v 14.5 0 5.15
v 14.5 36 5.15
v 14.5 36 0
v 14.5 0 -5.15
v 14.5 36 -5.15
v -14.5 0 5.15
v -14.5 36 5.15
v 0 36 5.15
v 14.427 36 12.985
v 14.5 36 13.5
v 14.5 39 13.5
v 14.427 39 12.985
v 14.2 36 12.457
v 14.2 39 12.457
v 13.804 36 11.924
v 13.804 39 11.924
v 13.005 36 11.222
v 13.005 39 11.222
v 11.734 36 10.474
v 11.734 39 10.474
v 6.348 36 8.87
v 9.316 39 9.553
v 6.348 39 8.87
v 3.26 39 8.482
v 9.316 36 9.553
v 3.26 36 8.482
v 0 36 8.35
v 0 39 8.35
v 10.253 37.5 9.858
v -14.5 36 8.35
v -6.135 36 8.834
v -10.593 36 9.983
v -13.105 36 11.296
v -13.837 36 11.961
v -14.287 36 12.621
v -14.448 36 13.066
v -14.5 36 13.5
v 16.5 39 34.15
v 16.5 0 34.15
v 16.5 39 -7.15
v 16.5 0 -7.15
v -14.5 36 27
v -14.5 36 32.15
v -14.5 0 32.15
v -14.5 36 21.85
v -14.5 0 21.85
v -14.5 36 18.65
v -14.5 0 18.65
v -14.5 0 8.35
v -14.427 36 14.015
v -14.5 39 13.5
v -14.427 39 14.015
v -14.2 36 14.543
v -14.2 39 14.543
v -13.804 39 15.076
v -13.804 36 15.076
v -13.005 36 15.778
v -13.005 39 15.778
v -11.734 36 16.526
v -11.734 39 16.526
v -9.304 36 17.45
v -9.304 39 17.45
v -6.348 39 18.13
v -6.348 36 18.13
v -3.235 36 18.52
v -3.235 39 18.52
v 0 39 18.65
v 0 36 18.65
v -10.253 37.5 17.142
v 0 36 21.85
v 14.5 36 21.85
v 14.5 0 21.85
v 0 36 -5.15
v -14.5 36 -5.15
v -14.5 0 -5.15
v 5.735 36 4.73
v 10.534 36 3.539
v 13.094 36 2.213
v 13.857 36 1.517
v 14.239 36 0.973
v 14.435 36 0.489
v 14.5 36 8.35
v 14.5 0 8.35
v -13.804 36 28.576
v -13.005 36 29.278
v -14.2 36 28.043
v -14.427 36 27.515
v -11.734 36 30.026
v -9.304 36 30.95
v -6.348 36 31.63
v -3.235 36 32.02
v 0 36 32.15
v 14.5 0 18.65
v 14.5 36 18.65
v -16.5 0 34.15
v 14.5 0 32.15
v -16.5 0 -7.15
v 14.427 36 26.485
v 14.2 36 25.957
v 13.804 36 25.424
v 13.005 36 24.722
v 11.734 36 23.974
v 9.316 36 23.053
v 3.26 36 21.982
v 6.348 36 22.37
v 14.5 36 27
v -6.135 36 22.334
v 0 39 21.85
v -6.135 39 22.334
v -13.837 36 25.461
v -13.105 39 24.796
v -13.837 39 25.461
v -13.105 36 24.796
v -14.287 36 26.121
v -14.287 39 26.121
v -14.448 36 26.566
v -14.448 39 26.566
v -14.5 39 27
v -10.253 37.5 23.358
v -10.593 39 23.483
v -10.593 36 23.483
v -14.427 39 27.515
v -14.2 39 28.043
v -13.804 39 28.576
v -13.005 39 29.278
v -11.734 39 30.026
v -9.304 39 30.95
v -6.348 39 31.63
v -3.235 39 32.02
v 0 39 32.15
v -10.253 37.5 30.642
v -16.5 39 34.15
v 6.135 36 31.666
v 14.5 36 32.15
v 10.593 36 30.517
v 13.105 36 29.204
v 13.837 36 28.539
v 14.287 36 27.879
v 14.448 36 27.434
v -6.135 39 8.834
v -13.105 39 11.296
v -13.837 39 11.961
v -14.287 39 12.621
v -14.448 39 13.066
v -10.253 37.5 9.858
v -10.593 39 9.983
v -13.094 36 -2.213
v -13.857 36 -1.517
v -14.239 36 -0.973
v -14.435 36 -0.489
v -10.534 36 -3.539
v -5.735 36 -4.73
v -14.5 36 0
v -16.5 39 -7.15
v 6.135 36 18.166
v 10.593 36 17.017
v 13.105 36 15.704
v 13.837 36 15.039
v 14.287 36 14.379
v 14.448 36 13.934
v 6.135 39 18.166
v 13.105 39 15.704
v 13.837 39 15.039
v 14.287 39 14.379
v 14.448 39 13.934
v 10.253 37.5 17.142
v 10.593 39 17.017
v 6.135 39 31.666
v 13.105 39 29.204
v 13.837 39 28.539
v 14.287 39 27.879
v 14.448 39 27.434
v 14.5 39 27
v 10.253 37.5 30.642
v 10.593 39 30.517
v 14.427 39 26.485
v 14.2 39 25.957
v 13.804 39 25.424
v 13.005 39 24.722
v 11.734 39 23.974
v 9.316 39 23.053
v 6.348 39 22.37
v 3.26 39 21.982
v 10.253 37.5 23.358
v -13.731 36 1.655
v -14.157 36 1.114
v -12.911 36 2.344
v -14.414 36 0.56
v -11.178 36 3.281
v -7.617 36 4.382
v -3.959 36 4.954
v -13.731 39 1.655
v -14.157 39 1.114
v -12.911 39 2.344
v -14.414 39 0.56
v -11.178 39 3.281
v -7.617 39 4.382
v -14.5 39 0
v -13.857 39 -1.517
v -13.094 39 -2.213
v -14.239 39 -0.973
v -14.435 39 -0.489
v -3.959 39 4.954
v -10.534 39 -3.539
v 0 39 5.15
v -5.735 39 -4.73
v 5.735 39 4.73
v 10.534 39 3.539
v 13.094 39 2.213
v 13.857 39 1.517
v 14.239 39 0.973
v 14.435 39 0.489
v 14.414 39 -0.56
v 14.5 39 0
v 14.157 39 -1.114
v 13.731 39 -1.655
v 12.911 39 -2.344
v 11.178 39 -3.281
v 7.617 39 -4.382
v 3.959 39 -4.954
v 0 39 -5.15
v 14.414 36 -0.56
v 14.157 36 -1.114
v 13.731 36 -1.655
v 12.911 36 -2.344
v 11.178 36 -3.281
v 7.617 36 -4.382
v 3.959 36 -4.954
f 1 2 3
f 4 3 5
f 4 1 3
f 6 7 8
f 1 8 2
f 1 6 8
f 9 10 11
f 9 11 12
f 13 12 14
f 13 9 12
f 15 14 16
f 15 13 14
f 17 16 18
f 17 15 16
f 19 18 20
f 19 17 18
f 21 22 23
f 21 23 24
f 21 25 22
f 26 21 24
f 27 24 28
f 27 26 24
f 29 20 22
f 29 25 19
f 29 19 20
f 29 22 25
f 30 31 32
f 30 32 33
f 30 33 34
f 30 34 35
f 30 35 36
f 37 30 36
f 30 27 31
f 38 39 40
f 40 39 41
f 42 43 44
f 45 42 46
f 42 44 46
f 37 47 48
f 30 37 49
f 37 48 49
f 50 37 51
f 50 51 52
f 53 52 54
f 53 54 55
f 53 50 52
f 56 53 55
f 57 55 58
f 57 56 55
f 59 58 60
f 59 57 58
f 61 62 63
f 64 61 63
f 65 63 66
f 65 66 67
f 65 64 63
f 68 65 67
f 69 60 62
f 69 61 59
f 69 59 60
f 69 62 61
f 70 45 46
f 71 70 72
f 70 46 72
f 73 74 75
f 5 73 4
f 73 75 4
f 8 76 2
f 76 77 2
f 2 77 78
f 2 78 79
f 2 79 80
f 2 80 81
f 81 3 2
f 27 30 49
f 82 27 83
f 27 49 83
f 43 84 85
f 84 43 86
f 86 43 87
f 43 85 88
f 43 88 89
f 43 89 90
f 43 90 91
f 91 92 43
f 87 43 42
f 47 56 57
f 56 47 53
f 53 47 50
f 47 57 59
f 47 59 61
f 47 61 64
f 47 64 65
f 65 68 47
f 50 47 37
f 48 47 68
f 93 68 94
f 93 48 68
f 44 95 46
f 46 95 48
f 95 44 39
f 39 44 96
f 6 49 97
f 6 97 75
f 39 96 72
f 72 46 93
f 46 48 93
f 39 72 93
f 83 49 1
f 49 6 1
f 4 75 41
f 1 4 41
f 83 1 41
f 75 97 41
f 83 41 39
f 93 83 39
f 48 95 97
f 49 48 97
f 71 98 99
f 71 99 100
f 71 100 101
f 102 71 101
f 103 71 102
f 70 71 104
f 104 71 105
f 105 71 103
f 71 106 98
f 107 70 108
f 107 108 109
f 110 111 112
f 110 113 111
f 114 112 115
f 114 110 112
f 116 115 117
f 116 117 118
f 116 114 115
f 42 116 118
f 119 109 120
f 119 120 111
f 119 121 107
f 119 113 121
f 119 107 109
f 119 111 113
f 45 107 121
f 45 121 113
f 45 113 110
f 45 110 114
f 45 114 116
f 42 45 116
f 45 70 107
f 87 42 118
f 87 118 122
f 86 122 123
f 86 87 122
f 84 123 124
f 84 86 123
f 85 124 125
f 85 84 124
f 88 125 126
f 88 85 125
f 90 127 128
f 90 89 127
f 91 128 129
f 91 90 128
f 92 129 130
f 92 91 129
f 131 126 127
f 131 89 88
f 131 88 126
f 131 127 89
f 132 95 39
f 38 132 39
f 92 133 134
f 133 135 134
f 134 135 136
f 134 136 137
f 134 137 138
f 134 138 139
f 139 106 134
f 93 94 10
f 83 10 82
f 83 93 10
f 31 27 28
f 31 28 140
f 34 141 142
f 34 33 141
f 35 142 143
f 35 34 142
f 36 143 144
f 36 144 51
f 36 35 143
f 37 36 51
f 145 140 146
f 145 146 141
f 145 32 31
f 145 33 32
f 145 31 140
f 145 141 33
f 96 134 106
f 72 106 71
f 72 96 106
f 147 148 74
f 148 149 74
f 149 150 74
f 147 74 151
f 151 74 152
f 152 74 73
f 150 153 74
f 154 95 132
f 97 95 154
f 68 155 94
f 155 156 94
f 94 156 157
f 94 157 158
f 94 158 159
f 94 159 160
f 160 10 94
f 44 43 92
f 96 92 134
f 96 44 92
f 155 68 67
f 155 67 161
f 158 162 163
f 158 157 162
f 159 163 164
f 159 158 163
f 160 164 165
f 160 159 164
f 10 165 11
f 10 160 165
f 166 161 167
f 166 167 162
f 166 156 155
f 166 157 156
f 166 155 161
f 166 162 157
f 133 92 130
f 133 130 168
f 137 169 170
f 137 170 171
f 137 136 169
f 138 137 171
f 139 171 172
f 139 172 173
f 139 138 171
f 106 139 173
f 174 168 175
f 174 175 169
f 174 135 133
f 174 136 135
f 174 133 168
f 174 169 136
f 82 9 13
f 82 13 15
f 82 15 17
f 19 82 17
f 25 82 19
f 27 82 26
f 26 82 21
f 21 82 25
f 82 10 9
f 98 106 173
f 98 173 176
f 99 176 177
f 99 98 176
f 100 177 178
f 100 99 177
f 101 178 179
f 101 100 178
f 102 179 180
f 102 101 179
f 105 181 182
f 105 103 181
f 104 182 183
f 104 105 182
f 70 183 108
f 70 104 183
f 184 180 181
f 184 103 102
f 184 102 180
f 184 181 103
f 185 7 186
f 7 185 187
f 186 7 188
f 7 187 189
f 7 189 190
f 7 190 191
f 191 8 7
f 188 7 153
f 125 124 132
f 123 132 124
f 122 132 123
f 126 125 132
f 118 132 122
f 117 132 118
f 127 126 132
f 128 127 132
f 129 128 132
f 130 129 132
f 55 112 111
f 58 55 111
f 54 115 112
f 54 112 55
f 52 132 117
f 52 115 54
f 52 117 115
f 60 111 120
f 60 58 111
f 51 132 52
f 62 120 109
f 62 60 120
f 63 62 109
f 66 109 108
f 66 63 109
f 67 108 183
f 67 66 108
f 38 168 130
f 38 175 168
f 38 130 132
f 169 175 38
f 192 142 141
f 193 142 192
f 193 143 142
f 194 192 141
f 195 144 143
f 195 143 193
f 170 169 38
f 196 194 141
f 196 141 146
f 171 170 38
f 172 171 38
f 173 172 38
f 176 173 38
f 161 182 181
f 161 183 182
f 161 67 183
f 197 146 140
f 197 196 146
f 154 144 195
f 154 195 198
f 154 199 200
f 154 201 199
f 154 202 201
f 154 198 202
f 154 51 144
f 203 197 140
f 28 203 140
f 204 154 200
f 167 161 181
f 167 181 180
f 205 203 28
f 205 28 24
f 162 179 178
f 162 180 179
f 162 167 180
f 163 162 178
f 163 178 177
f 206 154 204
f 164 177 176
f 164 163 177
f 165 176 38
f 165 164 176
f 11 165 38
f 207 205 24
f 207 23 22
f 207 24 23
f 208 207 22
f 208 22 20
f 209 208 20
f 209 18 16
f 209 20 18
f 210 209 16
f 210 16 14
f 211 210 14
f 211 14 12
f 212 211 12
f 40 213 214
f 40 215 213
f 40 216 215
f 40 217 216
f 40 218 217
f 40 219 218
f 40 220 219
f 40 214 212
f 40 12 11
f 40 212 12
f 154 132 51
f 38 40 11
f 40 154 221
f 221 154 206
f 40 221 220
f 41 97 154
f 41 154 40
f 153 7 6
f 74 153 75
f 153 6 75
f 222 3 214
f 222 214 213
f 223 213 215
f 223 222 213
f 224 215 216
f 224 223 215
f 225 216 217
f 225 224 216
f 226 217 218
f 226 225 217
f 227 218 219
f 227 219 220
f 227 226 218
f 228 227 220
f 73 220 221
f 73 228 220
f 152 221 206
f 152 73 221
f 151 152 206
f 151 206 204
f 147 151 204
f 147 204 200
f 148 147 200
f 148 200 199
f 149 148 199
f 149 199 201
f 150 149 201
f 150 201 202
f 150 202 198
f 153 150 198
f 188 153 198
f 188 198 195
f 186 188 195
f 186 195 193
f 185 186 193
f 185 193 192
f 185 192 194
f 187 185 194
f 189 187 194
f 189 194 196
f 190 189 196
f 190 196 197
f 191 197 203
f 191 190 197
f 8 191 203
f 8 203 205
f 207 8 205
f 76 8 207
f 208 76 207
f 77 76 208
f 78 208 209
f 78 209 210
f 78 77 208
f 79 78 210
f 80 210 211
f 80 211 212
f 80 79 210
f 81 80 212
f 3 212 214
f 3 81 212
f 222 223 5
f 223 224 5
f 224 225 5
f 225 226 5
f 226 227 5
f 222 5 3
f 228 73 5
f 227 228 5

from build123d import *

# Parameters (mm, degrees)
SKETCH_1_W             = 33
SKETCH_1_H             = 14.3
SKETCH_1_W_2           = 29
SKETCH_1_H_2           = 10.3
EXTRUDE_2_DEPTH        = 36
SKETCH_2_W             = 33
SKETCH_2_H             = 14.3
SKETCH_2_RX            = 14.5
SKETCH_2_RY            = 5.15
EXTRUDE_3_DEPTH        = 3
PATTERN_LINEAR_1_COUNT = 3
PATTERN_LINEAR_1_PITCH = 13.5


with BuildPart() as part:
    # 草图1 → 凸台-拉伸2 (new body)
    with BuildSketch(Plane(origin=(0, 0, 0), x_dir=(1, 0, 0), z_dir=(0, 1, 0))):
        Rectangle(SKETCH_1_W, SKETCH_1_H)
        Rectangle(SKETCH_1_W_2, SKETCH_1_H_2, mode=Mode.SUBTRACT)
    extrude_2 = extrude(amount=EXTRUDE_2_DEPTH)

    # 草图2 → 凸台-拉伸3 (add)
    with BuildSketch(Plane(origin=(0, 36, 0), x_dir=(1, 0, 0), z_dir=(0, 1, 0))):
        Rectangle(SKETCH_2_W, SKETCH_2_H)
        with Locations(Location((0, 0), (0, 0, 0))):
            Ellipse(SKETCH_2_RX, SKETCH_2_RY, mode=Mode.SUBTRACT)
    extrude_3 = extrude(amount=EXTRUDE_3_DEPTH)

    # 阵列(线性)1: 凸台-拉伸2, 凸台-拉伸3 ×3
    with Locations(*[(0, 0, i * PATTERN_LINEAR_1_PITCH) for i in range(1, PATTERN_LINEAR_1_COUNT)]):
        add(extrude_2)
        add(extrude_3)


solid = part.part
